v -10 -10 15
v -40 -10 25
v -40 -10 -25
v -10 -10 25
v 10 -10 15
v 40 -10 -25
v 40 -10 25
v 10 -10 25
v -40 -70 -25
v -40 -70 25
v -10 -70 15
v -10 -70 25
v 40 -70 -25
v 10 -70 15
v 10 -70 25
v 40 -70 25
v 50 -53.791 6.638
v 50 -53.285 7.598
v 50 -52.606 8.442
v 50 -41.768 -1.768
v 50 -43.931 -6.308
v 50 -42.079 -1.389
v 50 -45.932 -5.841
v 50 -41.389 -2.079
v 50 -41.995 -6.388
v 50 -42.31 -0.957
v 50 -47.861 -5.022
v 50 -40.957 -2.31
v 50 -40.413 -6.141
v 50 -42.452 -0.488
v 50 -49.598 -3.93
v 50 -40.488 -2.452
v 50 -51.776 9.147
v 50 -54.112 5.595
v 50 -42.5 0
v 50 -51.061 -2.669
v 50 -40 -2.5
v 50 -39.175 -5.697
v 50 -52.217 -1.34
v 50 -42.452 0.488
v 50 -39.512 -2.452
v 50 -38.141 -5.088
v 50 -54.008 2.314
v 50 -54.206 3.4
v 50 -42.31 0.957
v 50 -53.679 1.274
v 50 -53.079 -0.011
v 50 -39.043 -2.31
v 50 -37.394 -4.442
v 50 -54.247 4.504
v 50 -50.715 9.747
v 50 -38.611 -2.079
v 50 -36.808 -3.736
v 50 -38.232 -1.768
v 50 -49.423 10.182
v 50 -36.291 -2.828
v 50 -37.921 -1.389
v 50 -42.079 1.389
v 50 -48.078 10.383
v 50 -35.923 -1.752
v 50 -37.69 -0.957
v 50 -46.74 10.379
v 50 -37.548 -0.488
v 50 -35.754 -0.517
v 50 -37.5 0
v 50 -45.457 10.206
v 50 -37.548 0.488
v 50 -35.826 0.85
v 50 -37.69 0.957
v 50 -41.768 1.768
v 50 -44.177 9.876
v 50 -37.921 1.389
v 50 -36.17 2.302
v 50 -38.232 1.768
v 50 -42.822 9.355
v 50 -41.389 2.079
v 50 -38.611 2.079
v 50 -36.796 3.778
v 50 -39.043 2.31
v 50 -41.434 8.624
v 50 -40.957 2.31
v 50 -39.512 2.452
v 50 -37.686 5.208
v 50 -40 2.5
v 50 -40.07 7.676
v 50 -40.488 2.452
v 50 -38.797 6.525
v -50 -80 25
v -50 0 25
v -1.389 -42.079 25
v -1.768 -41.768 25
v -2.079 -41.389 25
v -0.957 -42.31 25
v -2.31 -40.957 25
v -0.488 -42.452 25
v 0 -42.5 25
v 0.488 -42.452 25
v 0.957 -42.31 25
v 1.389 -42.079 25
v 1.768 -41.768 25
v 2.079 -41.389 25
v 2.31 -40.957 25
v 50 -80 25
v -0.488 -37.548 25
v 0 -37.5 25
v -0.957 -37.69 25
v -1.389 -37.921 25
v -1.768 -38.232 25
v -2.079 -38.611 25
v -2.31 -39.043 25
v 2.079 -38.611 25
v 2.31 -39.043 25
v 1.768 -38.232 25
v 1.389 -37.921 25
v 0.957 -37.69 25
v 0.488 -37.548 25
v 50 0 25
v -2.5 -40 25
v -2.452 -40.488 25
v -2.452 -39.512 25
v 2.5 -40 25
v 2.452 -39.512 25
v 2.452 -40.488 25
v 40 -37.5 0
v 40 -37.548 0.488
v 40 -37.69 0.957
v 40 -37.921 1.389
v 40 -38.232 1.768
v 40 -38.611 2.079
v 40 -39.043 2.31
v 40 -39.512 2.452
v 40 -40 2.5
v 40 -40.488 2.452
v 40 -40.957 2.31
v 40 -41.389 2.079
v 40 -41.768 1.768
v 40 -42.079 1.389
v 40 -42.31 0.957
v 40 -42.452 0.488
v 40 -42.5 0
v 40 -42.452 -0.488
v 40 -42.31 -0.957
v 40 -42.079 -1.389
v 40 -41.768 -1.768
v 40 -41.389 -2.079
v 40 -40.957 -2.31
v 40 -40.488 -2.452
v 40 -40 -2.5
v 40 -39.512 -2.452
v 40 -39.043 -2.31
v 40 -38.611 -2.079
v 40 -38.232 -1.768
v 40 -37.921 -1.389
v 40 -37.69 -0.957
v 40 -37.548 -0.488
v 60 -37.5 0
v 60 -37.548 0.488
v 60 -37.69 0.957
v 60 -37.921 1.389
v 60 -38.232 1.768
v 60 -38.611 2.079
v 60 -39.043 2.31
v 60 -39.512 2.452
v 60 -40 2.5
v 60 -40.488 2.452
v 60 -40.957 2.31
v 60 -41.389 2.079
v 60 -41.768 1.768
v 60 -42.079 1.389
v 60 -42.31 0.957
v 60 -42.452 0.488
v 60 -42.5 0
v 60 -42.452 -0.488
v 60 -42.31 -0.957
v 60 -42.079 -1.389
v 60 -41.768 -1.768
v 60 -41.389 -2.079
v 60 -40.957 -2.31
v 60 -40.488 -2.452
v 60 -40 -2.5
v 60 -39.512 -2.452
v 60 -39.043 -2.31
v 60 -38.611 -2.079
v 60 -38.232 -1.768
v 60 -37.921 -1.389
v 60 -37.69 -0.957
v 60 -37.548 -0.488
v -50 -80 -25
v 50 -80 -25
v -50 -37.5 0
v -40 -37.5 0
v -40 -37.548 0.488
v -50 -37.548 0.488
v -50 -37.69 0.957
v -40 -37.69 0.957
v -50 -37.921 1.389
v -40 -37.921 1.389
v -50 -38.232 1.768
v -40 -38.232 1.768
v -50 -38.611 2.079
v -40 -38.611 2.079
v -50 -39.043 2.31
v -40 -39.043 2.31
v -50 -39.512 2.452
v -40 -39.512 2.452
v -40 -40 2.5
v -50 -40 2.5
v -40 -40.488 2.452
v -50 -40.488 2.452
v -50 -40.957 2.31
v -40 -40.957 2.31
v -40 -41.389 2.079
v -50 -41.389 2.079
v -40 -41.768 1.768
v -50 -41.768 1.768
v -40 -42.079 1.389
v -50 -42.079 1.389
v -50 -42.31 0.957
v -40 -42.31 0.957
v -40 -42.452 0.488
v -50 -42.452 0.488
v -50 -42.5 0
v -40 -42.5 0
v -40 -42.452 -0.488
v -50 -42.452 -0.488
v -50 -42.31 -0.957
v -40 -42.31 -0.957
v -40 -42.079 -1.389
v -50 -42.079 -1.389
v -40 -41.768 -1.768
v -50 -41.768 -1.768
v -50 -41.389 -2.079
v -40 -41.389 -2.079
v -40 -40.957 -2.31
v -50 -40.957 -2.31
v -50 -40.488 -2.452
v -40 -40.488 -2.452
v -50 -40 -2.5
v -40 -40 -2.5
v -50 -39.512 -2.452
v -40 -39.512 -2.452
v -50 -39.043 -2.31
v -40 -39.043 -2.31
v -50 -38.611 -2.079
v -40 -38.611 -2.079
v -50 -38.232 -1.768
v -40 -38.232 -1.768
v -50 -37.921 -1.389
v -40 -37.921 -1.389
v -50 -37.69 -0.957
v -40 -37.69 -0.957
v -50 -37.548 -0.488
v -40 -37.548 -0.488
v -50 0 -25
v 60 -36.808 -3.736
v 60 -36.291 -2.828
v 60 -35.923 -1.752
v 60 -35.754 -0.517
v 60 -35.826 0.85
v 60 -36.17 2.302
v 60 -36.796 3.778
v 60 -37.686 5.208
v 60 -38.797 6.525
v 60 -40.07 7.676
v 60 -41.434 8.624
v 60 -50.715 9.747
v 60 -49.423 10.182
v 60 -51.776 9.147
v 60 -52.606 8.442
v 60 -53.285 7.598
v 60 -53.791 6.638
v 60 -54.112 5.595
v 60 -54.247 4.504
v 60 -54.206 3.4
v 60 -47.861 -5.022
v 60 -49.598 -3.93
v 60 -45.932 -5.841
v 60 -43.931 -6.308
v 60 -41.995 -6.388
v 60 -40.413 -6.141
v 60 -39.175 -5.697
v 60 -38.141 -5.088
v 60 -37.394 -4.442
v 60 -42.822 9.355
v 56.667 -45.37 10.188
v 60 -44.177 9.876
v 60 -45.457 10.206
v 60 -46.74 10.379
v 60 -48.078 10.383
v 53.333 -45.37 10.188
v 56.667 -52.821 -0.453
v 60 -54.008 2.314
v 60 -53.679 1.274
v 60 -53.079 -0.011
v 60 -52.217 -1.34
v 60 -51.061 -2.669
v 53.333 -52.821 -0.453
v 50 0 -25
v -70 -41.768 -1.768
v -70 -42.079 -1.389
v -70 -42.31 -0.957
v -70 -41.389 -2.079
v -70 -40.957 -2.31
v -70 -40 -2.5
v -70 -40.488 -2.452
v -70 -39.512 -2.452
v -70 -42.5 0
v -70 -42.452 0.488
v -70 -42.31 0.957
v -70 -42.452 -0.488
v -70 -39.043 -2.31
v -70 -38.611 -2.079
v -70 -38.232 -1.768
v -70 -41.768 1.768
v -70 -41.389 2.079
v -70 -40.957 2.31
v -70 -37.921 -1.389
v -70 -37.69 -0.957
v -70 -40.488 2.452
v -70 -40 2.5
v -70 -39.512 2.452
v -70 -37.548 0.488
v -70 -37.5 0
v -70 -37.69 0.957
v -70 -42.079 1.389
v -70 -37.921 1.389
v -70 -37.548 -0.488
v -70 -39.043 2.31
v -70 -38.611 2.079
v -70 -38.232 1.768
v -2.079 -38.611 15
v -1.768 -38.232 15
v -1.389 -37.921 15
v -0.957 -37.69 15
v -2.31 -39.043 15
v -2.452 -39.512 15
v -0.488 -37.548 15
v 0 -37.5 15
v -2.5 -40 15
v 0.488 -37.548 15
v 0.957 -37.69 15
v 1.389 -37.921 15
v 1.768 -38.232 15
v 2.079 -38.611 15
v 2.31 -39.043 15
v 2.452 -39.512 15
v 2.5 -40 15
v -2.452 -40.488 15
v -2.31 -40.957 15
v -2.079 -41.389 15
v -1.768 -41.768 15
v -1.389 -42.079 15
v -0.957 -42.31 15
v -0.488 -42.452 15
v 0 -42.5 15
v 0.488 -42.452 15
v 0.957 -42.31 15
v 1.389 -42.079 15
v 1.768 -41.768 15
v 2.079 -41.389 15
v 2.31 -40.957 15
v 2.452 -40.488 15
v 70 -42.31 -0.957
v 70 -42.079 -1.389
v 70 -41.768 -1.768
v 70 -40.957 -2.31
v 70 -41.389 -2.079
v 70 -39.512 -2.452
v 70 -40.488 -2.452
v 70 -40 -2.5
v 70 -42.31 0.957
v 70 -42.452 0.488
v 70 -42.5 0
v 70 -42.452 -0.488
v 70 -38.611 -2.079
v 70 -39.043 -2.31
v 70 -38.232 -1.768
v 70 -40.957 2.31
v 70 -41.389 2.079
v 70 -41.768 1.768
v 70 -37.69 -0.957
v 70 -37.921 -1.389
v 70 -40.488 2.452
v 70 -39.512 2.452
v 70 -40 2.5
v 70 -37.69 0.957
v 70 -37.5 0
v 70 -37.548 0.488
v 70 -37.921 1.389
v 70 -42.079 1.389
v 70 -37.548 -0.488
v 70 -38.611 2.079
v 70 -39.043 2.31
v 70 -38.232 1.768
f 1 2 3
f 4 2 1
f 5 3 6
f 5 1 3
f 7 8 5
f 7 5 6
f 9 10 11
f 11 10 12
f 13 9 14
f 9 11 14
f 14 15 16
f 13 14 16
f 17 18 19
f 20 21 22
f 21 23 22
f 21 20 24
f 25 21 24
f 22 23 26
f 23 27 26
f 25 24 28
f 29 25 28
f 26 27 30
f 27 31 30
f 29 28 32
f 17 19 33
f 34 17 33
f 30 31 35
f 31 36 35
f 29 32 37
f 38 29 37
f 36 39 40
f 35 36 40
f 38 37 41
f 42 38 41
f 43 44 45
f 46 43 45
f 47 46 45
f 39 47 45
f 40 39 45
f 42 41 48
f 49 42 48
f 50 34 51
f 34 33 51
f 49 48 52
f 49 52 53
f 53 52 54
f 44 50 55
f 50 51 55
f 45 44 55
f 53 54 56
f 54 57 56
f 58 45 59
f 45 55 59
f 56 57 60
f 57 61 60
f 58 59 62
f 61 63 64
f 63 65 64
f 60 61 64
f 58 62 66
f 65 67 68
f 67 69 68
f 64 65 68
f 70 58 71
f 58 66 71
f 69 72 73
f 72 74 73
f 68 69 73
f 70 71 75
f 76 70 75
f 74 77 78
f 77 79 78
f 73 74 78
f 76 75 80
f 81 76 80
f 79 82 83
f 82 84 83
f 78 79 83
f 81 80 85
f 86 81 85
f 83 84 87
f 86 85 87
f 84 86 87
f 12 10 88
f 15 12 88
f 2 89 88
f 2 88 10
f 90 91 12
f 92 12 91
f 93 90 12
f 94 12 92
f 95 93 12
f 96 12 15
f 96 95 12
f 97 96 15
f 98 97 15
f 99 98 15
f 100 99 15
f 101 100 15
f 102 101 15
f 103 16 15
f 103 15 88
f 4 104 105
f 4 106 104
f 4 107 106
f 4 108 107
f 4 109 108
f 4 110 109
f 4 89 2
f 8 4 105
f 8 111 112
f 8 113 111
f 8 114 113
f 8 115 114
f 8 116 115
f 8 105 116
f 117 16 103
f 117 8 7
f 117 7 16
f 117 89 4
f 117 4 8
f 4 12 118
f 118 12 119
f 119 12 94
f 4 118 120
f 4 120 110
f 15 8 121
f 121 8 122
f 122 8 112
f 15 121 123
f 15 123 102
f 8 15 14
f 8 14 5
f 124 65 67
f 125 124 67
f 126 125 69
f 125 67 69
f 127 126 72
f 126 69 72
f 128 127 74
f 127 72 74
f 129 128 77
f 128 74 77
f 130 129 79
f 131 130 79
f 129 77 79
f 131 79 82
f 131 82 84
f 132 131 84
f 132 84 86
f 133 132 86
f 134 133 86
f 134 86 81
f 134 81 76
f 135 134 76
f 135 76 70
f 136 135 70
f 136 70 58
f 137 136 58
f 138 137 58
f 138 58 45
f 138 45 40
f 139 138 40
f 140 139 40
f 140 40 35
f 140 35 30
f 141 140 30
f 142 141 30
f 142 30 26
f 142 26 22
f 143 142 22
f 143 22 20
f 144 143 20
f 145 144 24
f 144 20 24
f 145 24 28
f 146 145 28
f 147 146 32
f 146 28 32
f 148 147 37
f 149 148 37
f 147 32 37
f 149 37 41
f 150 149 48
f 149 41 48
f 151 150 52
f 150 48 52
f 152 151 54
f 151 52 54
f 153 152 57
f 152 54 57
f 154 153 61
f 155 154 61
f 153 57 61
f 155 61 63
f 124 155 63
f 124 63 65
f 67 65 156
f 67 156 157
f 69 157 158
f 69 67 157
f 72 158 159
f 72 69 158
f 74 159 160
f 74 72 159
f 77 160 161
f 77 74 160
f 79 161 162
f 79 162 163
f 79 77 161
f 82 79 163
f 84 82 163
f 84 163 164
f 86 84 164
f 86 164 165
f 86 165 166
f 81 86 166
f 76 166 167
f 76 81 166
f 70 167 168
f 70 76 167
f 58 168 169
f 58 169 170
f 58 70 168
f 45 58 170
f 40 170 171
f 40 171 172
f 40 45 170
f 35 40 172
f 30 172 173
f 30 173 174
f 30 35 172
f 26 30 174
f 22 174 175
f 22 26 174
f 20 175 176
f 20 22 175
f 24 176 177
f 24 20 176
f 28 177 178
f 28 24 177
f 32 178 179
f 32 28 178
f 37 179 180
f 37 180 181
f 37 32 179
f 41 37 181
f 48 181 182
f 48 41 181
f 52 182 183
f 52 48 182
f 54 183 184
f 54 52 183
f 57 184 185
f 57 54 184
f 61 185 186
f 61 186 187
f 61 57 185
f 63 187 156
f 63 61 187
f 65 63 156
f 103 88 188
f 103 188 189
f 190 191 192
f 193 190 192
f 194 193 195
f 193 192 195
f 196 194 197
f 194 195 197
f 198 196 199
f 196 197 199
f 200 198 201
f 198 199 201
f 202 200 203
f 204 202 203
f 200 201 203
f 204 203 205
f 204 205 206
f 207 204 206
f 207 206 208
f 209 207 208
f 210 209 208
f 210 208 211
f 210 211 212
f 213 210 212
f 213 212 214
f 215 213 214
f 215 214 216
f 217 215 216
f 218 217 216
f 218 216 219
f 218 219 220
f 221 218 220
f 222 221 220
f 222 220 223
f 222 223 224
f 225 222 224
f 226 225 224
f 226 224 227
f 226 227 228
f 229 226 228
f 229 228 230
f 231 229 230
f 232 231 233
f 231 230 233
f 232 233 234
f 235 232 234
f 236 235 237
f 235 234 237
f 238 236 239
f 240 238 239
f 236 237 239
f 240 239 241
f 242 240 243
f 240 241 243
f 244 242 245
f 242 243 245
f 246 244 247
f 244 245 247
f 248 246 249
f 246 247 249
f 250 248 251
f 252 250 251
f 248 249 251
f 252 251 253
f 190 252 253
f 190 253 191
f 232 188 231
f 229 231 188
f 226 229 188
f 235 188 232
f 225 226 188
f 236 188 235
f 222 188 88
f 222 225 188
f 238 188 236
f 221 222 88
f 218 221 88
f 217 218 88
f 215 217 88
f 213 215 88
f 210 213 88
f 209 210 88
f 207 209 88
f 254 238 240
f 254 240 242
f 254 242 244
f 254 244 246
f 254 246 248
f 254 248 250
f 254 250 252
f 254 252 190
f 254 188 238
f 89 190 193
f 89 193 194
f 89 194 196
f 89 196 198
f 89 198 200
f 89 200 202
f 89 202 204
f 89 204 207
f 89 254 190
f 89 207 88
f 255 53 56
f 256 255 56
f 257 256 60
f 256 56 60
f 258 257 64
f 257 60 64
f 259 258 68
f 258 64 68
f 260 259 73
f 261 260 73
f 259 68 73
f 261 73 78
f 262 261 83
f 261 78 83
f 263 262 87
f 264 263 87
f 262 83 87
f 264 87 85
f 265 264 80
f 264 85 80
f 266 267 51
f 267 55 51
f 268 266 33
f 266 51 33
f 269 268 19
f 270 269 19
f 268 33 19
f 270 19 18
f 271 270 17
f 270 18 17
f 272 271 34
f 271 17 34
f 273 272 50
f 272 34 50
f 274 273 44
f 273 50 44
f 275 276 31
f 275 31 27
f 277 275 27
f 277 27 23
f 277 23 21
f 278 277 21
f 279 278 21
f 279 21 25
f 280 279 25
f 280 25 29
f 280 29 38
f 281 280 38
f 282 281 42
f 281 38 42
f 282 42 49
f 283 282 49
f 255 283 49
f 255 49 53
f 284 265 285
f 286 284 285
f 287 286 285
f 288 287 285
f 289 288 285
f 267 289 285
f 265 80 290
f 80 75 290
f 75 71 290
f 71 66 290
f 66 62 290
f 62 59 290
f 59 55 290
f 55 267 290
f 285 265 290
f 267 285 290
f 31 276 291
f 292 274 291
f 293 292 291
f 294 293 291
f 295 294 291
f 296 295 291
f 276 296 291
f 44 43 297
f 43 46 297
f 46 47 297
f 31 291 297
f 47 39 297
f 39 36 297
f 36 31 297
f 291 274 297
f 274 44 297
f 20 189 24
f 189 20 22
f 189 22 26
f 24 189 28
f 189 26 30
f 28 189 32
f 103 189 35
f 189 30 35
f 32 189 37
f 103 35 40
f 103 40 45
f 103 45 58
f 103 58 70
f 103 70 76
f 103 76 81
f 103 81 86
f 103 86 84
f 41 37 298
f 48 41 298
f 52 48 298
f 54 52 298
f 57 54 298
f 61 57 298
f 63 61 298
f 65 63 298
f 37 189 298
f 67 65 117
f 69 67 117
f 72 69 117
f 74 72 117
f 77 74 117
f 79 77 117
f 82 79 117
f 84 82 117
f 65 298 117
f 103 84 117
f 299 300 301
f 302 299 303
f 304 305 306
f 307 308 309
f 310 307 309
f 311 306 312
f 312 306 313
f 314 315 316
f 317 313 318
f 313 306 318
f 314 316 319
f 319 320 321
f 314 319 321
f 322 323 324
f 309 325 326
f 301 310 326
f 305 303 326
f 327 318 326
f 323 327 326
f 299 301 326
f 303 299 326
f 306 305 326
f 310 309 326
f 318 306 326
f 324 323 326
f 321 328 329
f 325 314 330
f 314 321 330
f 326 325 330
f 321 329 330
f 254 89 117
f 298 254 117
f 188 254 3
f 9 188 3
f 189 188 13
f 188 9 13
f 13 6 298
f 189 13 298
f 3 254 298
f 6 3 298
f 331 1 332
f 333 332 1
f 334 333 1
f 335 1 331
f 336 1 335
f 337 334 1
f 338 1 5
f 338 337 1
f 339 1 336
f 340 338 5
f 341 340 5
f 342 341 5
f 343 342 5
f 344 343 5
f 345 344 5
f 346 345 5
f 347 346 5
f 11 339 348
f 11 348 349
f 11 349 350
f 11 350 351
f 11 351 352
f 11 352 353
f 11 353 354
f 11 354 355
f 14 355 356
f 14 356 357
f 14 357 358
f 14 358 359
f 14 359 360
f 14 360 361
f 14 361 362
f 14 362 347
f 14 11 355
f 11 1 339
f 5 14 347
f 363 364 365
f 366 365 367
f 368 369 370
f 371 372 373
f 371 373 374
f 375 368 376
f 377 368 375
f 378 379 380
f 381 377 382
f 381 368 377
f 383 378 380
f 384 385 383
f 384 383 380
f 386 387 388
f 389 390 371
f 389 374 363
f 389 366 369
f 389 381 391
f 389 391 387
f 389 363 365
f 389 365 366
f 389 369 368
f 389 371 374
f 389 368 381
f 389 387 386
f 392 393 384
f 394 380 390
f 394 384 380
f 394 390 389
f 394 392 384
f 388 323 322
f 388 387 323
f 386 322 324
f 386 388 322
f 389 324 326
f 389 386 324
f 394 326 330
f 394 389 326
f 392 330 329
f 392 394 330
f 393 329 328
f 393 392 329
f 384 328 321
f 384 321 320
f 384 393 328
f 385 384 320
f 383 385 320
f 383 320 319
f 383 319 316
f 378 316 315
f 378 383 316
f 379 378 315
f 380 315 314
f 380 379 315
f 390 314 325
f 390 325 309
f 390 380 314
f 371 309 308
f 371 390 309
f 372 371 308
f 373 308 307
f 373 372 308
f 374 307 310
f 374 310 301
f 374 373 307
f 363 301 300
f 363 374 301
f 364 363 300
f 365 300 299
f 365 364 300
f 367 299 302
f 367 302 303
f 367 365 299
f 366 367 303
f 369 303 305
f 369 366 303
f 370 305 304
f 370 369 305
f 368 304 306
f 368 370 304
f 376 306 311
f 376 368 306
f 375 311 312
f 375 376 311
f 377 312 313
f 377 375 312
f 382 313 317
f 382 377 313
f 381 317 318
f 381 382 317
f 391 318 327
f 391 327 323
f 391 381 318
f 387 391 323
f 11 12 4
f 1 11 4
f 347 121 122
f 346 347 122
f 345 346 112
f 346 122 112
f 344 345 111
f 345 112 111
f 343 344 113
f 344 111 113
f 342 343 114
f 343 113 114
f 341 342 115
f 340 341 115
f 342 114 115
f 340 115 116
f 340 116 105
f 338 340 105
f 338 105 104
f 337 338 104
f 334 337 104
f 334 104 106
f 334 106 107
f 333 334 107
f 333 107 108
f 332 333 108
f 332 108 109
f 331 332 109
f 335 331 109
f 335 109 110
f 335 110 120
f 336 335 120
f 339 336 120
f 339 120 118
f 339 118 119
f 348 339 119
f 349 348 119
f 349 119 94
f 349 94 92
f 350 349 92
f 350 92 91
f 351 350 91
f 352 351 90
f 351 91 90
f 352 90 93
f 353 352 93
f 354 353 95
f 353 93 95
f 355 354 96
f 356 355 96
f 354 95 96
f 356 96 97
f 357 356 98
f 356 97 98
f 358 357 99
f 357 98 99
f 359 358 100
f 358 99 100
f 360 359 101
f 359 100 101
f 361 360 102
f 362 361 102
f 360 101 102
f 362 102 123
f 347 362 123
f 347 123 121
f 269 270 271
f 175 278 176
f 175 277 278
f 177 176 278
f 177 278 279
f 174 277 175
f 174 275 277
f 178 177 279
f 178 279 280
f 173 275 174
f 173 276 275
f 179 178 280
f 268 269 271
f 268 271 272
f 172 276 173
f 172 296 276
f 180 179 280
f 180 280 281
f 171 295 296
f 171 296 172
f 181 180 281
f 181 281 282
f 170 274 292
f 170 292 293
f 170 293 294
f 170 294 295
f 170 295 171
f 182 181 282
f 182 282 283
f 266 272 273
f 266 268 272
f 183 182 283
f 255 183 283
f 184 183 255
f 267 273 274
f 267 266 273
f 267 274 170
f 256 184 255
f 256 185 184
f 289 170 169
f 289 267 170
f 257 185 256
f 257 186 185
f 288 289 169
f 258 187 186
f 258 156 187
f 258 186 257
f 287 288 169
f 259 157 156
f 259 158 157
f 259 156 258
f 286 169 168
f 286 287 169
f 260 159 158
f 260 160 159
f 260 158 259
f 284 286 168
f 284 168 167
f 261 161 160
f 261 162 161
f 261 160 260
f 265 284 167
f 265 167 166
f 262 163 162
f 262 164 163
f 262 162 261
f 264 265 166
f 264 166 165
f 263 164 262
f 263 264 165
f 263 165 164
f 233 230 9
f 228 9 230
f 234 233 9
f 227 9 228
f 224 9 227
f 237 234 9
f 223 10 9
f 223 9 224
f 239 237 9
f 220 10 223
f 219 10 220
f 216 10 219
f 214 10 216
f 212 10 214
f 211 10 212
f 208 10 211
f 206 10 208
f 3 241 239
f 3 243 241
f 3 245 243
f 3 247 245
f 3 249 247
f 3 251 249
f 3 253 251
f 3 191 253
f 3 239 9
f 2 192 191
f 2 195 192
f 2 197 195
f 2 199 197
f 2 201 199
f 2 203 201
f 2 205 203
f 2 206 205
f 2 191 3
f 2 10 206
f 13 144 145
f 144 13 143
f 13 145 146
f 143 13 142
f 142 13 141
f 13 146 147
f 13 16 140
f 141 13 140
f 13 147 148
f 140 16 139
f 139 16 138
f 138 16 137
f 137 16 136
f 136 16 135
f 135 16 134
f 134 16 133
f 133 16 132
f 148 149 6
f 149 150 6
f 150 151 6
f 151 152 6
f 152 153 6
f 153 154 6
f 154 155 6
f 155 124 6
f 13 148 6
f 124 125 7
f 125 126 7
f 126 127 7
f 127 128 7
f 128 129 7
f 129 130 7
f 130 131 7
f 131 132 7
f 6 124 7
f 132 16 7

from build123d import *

# Parameters (mm, degrees)
F0_W          = 100
F0_H          = 50
F1_DEPTH      = 80
F2_W          = 30
F2_H          = 60
F3_DEPTH      = 50.001
F4_R          = 2.5
F5_DEPTH      = 100.001
F6_DEPTH      = 20
F6_DEPTH_BACK = 120
F7_R          = 2.5
F8_DEPTH      = 10
F9_W          = 20
F9_H          = 60
F10_DEPTH     = 40
F11_R         = 2.5
F12_DEPTH     = 50.001


with BuildPart() as f1:
    # F0 (on Front) → F1 (new body)
    with BuildSketch(Plane.XZ):
        Rectangle(F0_W, F0_H)
    extrude(amount=F1_DEPTH)

    # F2 (on face) → F3 (cut, through all)
    with BuildSketch(Plane.XY.offset(25)):
        with Locations((-25, -40)):
            Rectangle(F2_W, F2_H)
        with Locations((25, -40)):
            Rectangle(F2_W, F2_H)
    extrude(amount=-F3_DEPTH, mode=Mode.SUBTRACT)

    # F4 (on face) → F5 (cut, through all)
    with BuildSketch(Plane.YZ.offset(50)):
        with Locations((-40, 0)):
            Circle(F4_R)
    extrude(amount=-F5_DEPTH, mode=Mode.SUBTRACT)

    # F9 (on face) → F10 (cut)
    with BuildSketch(Plane(origin=(0, 0, -25), x_dir=(1, 0, 0), z_dir=(0, 0, -1))):
        with Locations((0, 40)):
            Rectangle(F9_W, F9_H)
    extrude(amount=-F10_DEPTH, mode=Mode.SUBTRACT)

    # F11 (on face) → F12 (cut, through all)
    with BuildSketch(Plane.XY.offset(25)):
        with Locations((0, -40)):
            Circle(F11_R)
    extrude(amount=-F12_DEPTH, mode=Mode.SUBTRACT)


with BuildPart() as f6:
    # F4 (on face) → F6 (new body, two sides)
    with BuildSketch(Plane.YZ.offset(50)) as f6_sk:
        with Locations((-40, 0)):
            Circle(F4_R)
    extrude(amount=F6_DEPTH)
    extrude(f6_sk.sketch, amount=-F6_DEPTH_BACK)


with BuildPart() as f8:
    # F7 (on face) → F8 (new body)
    with BuildSketch(Plane.YZ.offset(50)):
        with BuildLine():
            add(Edge.make_bspline(
                [(-36.8084795571, -3.7357643635), (-29.3575030837, 6.9053328352), (-45.3702719848, 10.1884307811), (-61.3830408858, 13.471528727), (-52.8212484581, -0.4526664176), (-44.2594560305, -14.3768615623), (-36.8084795571, -3.7357643635)],
                knots=[0, 0, 0, 2.0943951024, 2.0943951024, 4.1887902048, 4.1887902048, 6.2831853072, 6.2831853072, 6.2831853072], degree=2, weights=[1, 0.5, 1, 0.5, 1, 0.5, 1]))
        make_face()
        with Locations((-40, 0)):
            Circle(F7_R, mode=Mode.SUBTRACT)
    extrude(amount=F8_DEPTH)


solid = Compound([f1.part, f6.part, f8.part])
